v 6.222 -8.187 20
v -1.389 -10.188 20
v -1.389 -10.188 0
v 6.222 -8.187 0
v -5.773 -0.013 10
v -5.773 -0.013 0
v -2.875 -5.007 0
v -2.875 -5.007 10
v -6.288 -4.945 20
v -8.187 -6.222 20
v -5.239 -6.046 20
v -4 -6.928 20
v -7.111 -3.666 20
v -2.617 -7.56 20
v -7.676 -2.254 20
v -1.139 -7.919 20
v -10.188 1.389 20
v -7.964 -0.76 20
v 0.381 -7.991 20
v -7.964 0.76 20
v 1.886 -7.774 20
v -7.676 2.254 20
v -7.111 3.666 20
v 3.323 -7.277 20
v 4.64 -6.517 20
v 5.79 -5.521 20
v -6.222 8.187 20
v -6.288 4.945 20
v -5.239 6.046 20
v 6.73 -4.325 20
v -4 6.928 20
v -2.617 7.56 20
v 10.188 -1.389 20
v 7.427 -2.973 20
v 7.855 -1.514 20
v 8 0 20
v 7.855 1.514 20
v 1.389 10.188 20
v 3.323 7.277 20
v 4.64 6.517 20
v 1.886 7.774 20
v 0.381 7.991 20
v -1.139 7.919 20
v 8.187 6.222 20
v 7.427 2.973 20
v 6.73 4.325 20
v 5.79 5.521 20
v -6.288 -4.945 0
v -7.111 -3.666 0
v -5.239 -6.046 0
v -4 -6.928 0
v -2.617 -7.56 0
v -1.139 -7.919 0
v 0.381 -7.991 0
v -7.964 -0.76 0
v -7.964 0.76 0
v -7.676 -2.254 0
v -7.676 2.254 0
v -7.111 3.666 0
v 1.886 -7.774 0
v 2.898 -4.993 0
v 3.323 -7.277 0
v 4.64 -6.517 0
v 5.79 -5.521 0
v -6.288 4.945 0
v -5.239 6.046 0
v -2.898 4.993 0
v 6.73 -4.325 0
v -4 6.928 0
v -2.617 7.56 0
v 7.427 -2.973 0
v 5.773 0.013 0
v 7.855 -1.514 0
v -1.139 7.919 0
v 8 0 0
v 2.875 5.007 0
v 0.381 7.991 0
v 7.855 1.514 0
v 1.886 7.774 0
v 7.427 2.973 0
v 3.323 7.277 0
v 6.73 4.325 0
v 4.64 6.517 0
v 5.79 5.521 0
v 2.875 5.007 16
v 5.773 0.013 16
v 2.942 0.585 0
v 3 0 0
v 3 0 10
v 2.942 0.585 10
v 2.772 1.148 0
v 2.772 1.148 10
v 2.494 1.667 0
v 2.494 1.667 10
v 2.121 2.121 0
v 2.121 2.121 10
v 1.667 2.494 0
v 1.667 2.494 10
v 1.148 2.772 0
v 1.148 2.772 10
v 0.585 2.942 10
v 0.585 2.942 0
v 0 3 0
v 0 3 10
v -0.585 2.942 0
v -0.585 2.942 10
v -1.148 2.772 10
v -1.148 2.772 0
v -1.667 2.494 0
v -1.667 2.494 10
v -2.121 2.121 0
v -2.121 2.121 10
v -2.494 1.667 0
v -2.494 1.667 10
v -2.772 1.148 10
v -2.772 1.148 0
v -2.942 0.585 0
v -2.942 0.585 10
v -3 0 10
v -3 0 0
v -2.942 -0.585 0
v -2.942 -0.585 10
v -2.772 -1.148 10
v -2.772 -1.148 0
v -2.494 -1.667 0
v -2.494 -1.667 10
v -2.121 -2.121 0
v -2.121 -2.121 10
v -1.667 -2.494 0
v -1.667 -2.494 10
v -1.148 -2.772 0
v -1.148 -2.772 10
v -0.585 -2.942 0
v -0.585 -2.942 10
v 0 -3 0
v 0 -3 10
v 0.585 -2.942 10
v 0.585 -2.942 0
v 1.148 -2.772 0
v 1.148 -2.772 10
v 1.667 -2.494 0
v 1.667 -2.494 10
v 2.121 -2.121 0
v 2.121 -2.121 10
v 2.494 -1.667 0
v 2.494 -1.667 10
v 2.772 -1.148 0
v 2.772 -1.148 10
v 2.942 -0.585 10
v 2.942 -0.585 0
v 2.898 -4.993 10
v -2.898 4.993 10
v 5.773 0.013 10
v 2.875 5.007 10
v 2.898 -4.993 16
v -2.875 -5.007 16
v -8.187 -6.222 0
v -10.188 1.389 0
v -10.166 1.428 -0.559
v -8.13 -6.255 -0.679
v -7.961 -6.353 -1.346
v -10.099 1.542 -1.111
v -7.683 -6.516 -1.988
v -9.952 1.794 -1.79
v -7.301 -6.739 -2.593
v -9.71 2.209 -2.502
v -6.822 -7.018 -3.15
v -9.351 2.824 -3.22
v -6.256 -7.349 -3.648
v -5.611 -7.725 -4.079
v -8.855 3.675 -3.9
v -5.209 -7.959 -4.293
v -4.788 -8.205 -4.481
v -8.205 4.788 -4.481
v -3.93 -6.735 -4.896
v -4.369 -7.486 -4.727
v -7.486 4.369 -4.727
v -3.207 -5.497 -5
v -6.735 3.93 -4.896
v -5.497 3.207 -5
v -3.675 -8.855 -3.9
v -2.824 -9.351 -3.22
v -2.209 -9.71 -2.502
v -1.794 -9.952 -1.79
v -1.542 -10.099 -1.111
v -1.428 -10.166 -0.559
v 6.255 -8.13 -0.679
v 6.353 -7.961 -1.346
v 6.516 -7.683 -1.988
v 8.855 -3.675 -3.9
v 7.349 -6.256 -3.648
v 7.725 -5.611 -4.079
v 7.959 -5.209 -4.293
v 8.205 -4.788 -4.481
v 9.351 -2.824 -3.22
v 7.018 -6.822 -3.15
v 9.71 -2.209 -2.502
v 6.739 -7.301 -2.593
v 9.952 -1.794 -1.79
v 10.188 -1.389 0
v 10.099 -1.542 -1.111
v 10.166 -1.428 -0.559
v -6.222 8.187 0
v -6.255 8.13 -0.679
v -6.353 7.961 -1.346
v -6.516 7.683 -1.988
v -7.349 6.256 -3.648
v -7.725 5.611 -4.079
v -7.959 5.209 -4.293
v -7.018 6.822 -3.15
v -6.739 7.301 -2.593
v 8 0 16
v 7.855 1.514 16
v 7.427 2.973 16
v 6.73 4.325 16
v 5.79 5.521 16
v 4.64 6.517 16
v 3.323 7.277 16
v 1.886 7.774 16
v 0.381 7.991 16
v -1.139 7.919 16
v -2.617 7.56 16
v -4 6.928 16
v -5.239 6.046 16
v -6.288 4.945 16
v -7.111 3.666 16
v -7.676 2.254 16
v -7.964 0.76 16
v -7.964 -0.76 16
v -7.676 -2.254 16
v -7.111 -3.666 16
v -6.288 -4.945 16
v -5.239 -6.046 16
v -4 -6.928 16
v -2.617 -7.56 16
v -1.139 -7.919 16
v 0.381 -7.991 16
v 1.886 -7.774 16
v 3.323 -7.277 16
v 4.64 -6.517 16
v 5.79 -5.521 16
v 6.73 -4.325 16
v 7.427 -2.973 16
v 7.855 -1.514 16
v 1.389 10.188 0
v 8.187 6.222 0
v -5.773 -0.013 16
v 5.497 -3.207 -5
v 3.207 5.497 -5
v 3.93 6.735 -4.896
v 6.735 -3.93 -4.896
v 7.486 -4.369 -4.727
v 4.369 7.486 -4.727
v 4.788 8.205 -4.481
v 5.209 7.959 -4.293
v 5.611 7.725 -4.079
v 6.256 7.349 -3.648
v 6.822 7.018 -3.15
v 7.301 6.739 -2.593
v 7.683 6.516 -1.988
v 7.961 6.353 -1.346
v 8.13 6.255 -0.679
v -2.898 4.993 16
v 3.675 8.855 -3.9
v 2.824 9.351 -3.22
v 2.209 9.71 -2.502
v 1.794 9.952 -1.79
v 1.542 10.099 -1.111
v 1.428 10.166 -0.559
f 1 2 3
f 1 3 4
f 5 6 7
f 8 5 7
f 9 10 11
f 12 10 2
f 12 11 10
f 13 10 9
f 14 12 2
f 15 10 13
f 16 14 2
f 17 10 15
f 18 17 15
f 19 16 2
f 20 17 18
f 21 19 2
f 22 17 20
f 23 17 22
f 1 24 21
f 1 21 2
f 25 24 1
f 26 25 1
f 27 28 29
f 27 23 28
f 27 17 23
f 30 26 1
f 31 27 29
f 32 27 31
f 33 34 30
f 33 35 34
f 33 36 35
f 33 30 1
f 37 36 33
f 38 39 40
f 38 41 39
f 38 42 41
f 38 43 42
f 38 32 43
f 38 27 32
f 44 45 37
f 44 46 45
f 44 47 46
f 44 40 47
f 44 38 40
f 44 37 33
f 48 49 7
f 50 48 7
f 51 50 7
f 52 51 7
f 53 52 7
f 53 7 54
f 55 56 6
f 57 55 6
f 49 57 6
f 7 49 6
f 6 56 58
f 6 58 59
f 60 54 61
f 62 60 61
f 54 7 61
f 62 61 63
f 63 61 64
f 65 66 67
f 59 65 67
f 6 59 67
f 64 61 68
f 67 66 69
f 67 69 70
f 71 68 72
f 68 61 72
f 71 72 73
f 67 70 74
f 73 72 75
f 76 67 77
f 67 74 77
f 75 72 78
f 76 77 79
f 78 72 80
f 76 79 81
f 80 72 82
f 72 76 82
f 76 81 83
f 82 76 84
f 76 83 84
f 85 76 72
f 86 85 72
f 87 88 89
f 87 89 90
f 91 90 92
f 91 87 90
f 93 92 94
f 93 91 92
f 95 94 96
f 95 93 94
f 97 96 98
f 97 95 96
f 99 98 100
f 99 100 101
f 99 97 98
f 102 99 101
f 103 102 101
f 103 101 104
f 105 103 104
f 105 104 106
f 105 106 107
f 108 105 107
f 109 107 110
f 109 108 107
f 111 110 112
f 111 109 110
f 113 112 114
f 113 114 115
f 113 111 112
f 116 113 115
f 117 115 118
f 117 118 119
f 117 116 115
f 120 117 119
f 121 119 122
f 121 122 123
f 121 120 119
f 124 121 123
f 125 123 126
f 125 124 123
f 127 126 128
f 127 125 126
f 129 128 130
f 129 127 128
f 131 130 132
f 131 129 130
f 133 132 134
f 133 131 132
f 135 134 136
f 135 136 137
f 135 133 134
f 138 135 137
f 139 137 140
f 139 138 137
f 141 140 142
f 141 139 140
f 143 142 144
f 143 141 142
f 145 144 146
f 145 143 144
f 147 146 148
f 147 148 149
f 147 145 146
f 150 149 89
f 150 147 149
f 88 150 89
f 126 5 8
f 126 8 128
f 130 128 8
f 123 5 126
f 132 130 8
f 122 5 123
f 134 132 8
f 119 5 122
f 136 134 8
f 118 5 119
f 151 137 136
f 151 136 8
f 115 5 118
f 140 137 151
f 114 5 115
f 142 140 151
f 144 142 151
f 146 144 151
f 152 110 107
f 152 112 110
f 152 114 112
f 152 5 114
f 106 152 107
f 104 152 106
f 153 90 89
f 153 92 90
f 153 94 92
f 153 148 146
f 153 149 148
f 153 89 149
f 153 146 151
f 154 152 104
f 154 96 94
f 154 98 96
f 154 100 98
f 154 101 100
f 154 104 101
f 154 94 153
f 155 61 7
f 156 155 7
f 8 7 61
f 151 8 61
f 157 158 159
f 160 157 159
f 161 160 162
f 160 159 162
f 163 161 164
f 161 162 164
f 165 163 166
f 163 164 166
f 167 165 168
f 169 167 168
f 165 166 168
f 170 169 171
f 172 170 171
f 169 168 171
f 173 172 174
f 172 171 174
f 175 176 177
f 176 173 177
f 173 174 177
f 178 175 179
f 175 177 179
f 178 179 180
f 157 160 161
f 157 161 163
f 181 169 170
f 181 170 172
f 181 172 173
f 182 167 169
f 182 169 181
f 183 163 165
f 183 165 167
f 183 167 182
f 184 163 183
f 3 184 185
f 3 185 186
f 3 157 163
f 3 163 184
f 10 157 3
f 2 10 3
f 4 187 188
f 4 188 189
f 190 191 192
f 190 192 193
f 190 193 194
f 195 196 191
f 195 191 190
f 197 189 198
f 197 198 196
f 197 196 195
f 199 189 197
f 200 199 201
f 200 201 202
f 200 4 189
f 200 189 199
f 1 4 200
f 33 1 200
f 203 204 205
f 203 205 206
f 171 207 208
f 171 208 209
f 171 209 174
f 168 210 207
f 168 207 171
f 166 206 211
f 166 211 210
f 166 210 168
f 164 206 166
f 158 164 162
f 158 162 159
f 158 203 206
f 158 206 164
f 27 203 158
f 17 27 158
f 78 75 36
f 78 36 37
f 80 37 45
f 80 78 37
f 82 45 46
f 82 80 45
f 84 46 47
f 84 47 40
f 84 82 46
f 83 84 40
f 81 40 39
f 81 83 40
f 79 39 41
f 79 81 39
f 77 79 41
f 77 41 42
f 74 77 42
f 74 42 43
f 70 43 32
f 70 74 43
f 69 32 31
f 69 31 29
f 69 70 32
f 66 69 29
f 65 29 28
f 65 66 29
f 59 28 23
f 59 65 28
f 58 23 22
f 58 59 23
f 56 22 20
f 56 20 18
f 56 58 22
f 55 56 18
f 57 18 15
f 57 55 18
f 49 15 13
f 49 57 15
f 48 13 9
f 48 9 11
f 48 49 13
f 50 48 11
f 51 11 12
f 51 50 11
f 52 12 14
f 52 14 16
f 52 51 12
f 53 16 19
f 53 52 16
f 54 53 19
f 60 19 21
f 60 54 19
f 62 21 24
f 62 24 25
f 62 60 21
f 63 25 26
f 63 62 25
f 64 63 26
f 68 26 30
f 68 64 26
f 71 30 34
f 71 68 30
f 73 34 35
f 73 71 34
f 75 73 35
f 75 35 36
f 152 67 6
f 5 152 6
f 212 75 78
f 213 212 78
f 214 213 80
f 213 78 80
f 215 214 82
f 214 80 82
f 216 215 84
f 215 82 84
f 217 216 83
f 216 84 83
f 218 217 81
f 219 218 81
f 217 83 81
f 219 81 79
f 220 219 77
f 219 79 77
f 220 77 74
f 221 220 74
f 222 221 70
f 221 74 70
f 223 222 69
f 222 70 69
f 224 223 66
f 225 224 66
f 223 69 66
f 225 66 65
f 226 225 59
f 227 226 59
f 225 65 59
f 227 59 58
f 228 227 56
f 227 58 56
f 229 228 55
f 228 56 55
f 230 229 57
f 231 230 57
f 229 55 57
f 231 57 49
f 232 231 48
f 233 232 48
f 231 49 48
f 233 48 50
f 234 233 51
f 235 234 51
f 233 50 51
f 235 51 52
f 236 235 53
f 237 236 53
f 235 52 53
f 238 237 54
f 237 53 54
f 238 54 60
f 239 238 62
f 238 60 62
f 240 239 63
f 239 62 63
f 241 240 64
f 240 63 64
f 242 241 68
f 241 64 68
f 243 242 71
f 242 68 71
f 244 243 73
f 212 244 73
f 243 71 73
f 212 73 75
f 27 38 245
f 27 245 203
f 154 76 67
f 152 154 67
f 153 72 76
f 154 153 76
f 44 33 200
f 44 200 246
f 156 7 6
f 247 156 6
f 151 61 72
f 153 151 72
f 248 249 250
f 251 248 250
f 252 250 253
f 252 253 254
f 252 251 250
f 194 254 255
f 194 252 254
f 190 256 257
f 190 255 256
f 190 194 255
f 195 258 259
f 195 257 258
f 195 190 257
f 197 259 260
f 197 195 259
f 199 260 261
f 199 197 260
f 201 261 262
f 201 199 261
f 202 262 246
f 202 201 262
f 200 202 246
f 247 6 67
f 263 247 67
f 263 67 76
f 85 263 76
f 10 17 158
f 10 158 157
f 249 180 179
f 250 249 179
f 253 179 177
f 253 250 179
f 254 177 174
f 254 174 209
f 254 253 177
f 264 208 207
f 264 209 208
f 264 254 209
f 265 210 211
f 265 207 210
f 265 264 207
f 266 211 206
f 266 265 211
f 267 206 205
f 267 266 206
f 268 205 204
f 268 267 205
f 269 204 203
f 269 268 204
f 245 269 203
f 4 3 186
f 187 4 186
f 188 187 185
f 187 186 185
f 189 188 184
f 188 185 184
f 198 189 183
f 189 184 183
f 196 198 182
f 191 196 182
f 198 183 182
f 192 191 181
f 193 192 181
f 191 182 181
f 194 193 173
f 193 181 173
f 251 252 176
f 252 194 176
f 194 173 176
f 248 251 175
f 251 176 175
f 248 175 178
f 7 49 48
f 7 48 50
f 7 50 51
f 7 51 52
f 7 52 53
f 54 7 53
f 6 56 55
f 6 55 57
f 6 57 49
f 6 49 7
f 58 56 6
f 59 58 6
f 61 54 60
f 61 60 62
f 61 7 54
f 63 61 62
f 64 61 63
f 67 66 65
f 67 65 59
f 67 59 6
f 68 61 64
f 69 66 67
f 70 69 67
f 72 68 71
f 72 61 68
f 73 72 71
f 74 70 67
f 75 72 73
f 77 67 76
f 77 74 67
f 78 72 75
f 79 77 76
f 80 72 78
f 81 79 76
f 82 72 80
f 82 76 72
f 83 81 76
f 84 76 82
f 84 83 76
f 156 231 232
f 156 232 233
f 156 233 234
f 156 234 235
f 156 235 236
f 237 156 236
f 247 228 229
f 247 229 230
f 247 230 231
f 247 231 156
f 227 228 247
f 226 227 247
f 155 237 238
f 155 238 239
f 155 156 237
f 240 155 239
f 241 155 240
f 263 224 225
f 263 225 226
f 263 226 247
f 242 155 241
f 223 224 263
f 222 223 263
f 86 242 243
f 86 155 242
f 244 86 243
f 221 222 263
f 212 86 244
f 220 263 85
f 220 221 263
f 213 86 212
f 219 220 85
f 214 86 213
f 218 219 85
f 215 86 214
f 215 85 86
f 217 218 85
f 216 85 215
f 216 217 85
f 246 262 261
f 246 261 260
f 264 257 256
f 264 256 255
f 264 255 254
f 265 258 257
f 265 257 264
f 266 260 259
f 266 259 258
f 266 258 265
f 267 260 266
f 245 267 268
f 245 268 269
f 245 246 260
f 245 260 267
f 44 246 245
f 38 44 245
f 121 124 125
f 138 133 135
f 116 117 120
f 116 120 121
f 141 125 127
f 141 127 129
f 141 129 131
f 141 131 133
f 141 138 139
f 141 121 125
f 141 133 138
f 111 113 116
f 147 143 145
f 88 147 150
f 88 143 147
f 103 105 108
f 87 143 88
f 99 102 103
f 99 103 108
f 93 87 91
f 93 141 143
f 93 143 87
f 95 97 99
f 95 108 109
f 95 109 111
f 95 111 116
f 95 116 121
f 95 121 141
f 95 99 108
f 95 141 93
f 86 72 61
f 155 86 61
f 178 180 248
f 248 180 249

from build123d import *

# Parameters (mm, degrees)
F0_R        = 8
F1_DEPTH    = 20
F0_R_2      = 3
F2_DEPTH    = 5
F3_DEPTH    = 10
F4_DEPTH    = 16
F5_T1_DEPTH = 32.8700576851
F5_T3_DEPTH = 32.8700576851
F5_T5_DEPTH = 32.8700576851
F5_T7_DEPTH = 32.8700576851


# Not quite as in the source:
# - a fillet or chamfer that OpenCascade refuses, or shapes differently, is made with other operations: its cross-section is extruded or revolved along the edge and cut away or added


with BuildPart() as f1:
    # F0 (on Top) → F1 (new body)
    with BuildSketch(Plane.XY):
        Polygon((6.2218713056, -8.1867435191), (10.1884292501, -1.3893744663), (8.1867435191, 6.2218713056), (1.3893744663, 10.1884292501), (-6.2218713056, 8.1867435191), (-10.1884292501, 1.3893744663), (-8.1867435191, -6.2218713056), (-1.3893744663, -10.1884292501), align=None)
        Circle(F0_R, mode=Mode.SUBTRACT)
    extrude(amount=F1_DEPTH)

    # F0 (on Top) → F2 (join)
    with BuildSketch(Plane.XY):
        Polygon((6.2218713056, -8.1867435191), (10.1884292501, -1.3893744663), (8.1867435191, 6.2218713056), (1.3893744663, 10.1884292501), (-6.2218713056, 8.1867435191), (-10.1884292501, 1.3893744663), (-8.1867435191, -6.2218713056), (-1.3893744663, -10.1884292501), align=None)
        Circle(F0_R, mode=Mode.SUBTRACT)
        Circle(F0_R)
        Polygon((-2.8984208181, 4.9932444457), (2.8750661283, 5.0067282822), (5.7734869463, 0.0134838364), (2.8984208181, -4.9932444457), (-2.8750661283, -5.0067282822), (-5.7734869463, -0.0134838364), align=None, mode=Mode.SUBTRACT)
        Polygon((5.7734869463, 0.0134838364), (2.8750661283, 5.0067282822), (-2.8984208181, 4.9932444457), (-5.7734869463, -0.0134838364), (-2.8750661283, -5.0067282822), (2.8984208181, -4.9932444457), align=None)
        Circle(F0_R_2, mode=Mode.SUBTRACT)
        Circle(F0_R_2)
    extrude(amount=-F2_DEPTH)

    # F0 (on Top) → F3 (join)
    with BuildSketch(Plane.XY):
        Polygon((5.7734869463, 0.0134838364), (2.8750661283, 5.0067282822), (-2.8984208181, 4.9932444457), (-5.7734869463, -0.0134838364), (-2.8750661283, -5.0067282822), (2.8984208181, -4.9932444457), align=None)
        Circle(F0_R_2, mode=Mode.SUBTRACT)
    extrude(amount=F3_DEPTH)

    # F5: fillet of radius 5 on 4 edges, made by hand

    # F5_s2 → F5_t1 (cut)
    with BuildSketch(Plane(origin=(-15.8945523394, -4.1801171018, 0), x_dir=(0, 0, 1), z_dir=(0.9671143563, 0.2543419389, 0))):
        with BuildLine():
            ThreePointArc((0, 9.5), (-3.5355339059, 8.0355339059), (-5, 4.5))
            Line((-5, 4.5), (-5, 9.5))
            Line((-5, 9.5), (0, 9.5))
        make_face()
    extrude(amount=F5_T1_DEPTH, mode=Mode.SUBTRACT)

    # F5_s4 → F5_t3 (cut)
    with BuildSketch(Plane(origin=(-4.1801171018, 15.8945523394, 0), x_dir=(0, 0, 1), z_dir=(0.2543419389, -0.9671143563, 0))):
        with BuildLine():
            ThreePointArc((0, 9.5), (-3.5355339059, 8.0355339059), (-5, 4.5))
            Line((-5, 4.5), (-5, 9.5))
            Line((-5, 9.5), (0, 9.5))
        make_face()
    extrude(amount=F5_T3_DEPTH, mode=Mode.SUBTRACT)

    # F5_s6 → F5_t5 (cut)
    with BuildSketch(Plane(origin=(15.8945523394, 4.1801171018, 0), x_dir=(0, 0, 1), z_dir=(-0.9671143563, -0.2543419389, 0))):
        with BuildLine():
            ThreePointArc((-5, 4.5), (-3.5355339059, 8.0355339059), (0, 9.5))
            Line((0, 9.5), (-5, 9.5))
            Line((-5, 9.5), (-5, 4.5))
        make_face()
    extrude(amount=F5_T5_DEPTH, mode=Mode.SUBTRACT)

    # F5_s8 → F5_t7 (cut)
    with BuildSketch(Plane(origin=(4.1801171018, -15.8945523394, 0), x_dir=(0, 0, 1), z_dir=(-0.2543419389, 0.9671143563, 0))):
        with BuildLine():
            ThreePointArc((-5, 4.5), (-3.5355339059, 8.0355339059), (0, 9.5))
            Line((0, 9.5), (-5, 9.5))
            Line((-5, 9.5), (-5, 4.5))
        make_face()
    extrude(amount=F5_T7_DEPTH, mode=Mode.SUBTRACT)


with BuildPart() as f4:
    # F0 (on Top) → F4 (new body)
    with BuildSketch(Plane.XY):
        Circle(F0_R)
        Polygon((-2.8984208181, 4.9932444457), (2.8750661283, 5.0067282822), (5.7734869463, 0.0134838364), (2.8984208181, -4.9932444457), (-2.8750661283, -5.0067282822), (-5.7734869463, -0.0134838364), align=None, mode=Mode.SUBTRACT)
    extrude(amount=F4_DEPTH)


solid = Compound([f1.part, f4.part])
